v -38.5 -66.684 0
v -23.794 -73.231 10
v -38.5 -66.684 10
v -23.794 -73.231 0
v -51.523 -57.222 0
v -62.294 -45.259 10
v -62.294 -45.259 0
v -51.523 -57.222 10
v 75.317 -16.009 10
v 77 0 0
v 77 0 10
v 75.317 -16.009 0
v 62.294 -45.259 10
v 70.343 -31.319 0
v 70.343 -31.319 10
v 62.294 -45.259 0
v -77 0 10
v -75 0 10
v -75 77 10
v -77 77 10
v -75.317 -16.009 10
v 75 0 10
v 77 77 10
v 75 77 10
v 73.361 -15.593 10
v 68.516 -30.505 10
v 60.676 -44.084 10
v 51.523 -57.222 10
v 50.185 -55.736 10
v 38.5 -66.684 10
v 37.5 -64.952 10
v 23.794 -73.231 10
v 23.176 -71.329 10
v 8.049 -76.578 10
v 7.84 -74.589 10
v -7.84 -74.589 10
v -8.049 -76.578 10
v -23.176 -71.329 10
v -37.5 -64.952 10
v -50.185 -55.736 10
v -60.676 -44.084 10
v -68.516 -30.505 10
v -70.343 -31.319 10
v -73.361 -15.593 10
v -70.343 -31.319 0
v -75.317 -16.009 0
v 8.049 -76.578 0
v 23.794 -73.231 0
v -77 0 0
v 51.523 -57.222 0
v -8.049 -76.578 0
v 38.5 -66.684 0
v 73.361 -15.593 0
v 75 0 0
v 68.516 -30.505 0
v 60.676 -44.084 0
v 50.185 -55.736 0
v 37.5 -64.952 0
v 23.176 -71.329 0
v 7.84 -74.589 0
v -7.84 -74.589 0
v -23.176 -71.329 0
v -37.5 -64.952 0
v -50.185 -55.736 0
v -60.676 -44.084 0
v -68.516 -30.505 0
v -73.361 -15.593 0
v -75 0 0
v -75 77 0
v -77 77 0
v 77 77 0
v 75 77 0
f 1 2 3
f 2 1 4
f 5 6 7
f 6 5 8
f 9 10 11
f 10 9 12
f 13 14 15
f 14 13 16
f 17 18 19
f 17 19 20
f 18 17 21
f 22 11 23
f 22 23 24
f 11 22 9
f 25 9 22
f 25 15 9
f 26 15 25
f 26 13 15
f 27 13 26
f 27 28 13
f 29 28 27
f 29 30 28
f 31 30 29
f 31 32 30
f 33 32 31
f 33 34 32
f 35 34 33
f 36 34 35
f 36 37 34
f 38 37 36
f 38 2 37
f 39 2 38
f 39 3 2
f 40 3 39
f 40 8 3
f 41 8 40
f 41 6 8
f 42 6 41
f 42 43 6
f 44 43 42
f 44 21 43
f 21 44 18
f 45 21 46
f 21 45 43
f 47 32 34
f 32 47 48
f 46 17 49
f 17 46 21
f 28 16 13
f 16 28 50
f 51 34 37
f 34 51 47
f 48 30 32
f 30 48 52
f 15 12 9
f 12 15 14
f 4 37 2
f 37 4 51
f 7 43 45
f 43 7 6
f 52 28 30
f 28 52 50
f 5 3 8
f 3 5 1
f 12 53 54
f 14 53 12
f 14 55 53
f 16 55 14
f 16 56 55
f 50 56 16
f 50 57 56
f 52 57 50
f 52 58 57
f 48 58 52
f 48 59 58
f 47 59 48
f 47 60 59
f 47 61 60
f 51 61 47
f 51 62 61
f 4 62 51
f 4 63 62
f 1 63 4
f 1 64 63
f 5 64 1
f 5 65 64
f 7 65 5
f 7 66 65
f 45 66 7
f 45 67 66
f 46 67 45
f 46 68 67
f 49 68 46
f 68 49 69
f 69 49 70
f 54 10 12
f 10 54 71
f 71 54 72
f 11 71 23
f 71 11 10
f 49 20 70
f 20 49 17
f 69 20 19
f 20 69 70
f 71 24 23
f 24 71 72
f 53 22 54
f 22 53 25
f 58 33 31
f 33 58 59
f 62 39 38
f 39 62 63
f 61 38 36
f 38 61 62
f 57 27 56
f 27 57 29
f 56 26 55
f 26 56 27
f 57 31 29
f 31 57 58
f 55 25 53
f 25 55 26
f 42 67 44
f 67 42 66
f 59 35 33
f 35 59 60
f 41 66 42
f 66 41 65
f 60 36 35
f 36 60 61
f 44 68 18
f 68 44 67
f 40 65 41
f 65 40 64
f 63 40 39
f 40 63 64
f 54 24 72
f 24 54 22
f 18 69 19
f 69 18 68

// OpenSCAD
id=150;
t=2;
w=10;

difference() {
  baseThing(d=id+t*2,h=w,el=0);
  translate([0,0,-1]) baseThing(d=id,h=w+2,el=5);
}

module baseThing(d,h,el) {
  union() {
    cylinder(d=d,h=h);
    translate([-d/2,0,0]) cube([d,d/2+el,h]);
  }
}
